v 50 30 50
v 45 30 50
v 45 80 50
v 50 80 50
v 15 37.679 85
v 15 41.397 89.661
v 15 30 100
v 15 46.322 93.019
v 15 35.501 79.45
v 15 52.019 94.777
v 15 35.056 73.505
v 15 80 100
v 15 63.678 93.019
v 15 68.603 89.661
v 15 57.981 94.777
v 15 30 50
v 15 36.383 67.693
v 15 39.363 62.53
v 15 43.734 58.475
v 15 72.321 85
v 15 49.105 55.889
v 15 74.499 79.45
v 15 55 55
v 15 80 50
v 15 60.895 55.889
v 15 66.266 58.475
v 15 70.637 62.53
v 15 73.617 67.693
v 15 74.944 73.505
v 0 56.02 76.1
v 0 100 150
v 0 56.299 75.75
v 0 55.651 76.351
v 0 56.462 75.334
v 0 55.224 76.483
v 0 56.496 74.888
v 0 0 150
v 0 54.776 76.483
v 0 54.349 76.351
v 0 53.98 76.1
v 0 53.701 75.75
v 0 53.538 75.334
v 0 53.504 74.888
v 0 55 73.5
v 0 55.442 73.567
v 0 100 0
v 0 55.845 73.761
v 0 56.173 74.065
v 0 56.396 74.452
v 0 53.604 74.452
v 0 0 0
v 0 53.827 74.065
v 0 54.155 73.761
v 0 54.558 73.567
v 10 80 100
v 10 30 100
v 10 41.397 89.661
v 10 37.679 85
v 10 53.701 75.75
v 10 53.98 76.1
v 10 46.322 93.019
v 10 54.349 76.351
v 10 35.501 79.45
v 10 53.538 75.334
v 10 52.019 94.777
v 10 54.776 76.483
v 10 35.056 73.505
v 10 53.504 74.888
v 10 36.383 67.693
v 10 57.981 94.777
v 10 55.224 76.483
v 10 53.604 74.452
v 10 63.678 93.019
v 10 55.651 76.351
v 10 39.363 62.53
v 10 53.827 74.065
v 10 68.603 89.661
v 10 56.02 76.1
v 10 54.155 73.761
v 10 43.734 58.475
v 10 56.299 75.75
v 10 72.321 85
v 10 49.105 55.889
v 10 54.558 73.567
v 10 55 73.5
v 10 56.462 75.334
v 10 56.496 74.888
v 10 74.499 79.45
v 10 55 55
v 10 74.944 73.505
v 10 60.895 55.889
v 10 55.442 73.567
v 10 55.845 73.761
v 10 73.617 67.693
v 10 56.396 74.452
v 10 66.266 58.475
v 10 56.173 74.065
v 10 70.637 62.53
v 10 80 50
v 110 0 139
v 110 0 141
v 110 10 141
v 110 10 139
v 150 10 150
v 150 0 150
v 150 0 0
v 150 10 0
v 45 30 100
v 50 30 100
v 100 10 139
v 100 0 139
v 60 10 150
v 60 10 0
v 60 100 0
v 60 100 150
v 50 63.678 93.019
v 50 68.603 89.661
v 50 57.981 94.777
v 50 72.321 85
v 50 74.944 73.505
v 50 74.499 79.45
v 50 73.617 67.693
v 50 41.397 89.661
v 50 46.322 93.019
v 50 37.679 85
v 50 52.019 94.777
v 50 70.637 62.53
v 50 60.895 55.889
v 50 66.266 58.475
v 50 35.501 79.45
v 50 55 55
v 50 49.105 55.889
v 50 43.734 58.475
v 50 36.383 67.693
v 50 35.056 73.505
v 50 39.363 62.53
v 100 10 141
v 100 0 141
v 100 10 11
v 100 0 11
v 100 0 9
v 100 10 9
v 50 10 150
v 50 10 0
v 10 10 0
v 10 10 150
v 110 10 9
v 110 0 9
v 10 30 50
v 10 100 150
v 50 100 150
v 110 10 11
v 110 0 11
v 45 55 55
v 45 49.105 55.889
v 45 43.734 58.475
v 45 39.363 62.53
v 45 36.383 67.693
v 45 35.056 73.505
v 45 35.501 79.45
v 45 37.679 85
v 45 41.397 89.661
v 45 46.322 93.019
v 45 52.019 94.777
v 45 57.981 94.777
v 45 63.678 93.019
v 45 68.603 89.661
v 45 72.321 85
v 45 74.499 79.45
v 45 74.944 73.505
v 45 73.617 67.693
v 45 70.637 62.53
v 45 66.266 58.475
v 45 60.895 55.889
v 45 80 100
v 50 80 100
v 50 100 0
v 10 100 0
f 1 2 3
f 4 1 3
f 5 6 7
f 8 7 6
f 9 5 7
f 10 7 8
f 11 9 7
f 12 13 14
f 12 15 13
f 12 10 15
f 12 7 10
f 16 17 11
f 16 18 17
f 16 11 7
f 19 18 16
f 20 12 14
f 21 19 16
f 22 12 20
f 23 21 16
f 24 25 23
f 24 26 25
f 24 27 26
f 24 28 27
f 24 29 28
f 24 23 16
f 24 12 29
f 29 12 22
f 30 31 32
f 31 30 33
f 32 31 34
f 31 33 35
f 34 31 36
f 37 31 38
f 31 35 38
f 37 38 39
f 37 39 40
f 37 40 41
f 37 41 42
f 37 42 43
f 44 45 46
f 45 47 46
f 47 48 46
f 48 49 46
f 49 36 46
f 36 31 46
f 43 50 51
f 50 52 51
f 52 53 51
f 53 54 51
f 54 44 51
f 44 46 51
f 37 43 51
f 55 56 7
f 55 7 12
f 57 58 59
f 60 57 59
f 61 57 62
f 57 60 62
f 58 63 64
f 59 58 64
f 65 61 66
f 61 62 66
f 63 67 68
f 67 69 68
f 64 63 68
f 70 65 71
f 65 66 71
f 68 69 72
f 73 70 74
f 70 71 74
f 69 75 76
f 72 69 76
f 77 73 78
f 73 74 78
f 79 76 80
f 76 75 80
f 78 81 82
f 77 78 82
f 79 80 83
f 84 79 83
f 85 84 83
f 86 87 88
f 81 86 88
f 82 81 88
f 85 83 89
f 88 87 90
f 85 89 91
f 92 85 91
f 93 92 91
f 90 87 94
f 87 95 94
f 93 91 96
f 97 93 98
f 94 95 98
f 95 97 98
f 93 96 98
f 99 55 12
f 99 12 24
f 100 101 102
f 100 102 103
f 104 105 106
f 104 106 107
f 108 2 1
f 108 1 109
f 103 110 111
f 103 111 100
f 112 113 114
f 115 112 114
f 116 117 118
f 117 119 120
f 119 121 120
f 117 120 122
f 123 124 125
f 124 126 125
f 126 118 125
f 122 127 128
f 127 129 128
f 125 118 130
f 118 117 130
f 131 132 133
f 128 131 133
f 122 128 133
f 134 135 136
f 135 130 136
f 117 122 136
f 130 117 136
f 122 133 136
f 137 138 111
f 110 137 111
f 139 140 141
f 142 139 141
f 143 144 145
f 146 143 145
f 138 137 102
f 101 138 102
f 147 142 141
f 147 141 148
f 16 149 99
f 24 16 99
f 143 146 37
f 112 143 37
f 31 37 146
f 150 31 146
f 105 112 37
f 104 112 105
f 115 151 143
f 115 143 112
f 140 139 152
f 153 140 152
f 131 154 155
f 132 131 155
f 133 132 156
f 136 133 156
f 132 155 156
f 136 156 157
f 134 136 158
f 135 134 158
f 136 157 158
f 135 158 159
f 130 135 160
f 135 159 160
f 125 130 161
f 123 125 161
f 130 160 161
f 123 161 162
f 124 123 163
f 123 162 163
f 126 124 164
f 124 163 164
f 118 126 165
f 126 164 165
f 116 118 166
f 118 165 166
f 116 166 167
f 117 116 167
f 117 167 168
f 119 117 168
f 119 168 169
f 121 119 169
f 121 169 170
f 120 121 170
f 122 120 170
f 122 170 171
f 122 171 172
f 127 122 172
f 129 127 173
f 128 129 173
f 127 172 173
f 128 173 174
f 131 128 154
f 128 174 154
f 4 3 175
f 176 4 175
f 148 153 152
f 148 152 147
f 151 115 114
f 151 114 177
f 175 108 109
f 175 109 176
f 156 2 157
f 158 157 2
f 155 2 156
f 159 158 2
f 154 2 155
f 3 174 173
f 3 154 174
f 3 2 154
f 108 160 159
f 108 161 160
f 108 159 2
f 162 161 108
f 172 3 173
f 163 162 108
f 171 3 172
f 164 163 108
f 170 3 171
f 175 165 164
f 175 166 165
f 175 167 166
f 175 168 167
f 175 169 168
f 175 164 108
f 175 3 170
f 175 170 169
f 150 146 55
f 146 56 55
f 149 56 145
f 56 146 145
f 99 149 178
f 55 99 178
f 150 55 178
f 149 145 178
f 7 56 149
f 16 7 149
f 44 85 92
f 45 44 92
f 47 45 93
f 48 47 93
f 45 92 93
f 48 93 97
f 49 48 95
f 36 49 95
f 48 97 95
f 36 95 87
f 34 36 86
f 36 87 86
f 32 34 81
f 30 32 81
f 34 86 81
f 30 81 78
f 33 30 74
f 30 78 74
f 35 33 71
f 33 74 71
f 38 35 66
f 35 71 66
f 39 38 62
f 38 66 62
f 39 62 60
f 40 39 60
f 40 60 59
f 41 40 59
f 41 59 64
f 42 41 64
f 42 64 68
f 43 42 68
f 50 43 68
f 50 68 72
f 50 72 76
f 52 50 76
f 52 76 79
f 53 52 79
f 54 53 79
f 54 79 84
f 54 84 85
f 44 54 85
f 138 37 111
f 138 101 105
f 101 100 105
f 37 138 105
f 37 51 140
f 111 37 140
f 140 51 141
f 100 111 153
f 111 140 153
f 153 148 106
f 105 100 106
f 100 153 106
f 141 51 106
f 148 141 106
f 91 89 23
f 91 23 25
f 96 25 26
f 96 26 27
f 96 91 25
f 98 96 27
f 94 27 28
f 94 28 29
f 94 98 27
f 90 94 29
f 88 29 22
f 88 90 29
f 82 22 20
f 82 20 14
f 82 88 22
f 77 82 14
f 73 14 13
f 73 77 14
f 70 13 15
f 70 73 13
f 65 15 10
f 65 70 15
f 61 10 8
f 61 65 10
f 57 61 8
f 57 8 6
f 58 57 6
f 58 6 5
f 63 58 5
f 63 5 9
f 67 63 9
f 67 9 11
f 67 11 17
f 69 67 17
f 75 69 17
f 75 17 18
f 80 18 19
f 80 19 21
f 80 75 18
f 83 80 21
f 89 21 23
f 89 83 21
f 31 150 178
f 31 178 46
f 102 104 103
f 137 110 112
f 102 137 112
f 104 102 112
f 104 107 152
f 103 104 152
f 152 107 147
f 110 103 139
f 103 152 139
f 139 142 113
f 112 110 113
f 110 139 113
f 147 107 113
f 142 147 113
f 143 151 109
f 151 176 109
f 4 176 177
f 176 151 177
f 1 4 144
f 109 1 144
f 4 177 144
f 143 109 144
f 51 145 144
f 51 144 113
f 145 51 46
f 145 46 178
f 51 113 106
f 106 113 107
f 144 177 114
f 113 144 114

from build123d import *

# Parameters (mm, degrees)
BOSS_EXTRUDE1_DEPTH = 150
SKETCH3_W           = 10
SKETCH3_H           = 2
CUT_EXTRUDE1_DEPTH  = 10
SKETCH4_W           = 50
SKETCH4_H           = 50
SKETCH4_R           = 20
BOSS_EXTRUDE2_DEPTH = 5
BOSS_EXTRUDE3_START = 5
SKETCH5_W           = 50
SKETCH5_H           = 50
SKETCH5_R           = 20
BOSS_EXTRUDE3_DEPTH = 5
SKETCH6_R           = 1.5
CUT_EXTRUDE2_DEPTH  = 229.25424421


with BuildPart() as part:
    # Sketch1 → Boss-Extrude1 (new body)
    with BuildSketch(Plane.XY):
        Polygon((50, 100), (50, 10), (10, 10), (10, 100), (0, 100), (0, 10), (0, 0), (10, 0), (150, 0), (150, 10), (60, 10), (60, 100), align=None)
    extrude(amount=BOSS_EXTRUDE1_DEPTH)

    # Sketch3 → Cut-Extrude1 (cut)
    with BuildSketch(Plane(origin=(0, 10, 0), x_dir=(1, 0, 0), z_dir=(0, 1, 0))):
        with Locations((105, -10)):
            Rectangle(SKETCH3_W, SKETCH3_H)
        with Locations((105, -140)):
            Rectangle(SKETCH3_W, SKETCH3_H)
    extrude(amount=-CUT_EXTRUDE1_DEPTH, mode=Mode.SUBTRACT)

    # Sketch4 → Boss-Extrude2 (add)
    with BuildSketch(Plane(origin=(10, 0, 0), x_dir=(0, 0, -1), z_dir=(1, 0, 0))):
        with Locations((-75, 55)):
            Rectangle(SKETCH4_W, SKETCH4_H)
        with Locations((-75, 55)):
            Circle(SKETCH4_R, mode=Mode.SUBTRACT)
    extrude(amount=BOSS_EXTRUDE2_DEPTH)

    # Sketch5 → Boss-Extrude3 (add)
    with BuildSketch(Plane.ZY.offset(-50).offset(BOSS_EXTRUDE3_START)):
        with Locations((75, 55)):
            Rectangle(SKETCH5_W, SKETCH5_H)
        with Locations(Location((75, 55, 0), (0, 0, 180))):
            Circle(SKETCH5_R, mode=Mode.SUBTRACT)
    extrude(amount=-BOSS_EXTRUDE3_DEPTH)

    # Sketch6 → Cut-Extrude2 (cut, through all)
    with BuildSketch(Plane(origin=(10, 0, 0), x_dir=(0, 0, -1), z_dir=(1, 0, 0))):
        with Locations((-75, 55)):
            Circle(SKETCH6_R)
    extrude(amount=-CUT_EXTRUDE2_DEPTH, mode=Mode.SUBTRACT)


solid = part.part
